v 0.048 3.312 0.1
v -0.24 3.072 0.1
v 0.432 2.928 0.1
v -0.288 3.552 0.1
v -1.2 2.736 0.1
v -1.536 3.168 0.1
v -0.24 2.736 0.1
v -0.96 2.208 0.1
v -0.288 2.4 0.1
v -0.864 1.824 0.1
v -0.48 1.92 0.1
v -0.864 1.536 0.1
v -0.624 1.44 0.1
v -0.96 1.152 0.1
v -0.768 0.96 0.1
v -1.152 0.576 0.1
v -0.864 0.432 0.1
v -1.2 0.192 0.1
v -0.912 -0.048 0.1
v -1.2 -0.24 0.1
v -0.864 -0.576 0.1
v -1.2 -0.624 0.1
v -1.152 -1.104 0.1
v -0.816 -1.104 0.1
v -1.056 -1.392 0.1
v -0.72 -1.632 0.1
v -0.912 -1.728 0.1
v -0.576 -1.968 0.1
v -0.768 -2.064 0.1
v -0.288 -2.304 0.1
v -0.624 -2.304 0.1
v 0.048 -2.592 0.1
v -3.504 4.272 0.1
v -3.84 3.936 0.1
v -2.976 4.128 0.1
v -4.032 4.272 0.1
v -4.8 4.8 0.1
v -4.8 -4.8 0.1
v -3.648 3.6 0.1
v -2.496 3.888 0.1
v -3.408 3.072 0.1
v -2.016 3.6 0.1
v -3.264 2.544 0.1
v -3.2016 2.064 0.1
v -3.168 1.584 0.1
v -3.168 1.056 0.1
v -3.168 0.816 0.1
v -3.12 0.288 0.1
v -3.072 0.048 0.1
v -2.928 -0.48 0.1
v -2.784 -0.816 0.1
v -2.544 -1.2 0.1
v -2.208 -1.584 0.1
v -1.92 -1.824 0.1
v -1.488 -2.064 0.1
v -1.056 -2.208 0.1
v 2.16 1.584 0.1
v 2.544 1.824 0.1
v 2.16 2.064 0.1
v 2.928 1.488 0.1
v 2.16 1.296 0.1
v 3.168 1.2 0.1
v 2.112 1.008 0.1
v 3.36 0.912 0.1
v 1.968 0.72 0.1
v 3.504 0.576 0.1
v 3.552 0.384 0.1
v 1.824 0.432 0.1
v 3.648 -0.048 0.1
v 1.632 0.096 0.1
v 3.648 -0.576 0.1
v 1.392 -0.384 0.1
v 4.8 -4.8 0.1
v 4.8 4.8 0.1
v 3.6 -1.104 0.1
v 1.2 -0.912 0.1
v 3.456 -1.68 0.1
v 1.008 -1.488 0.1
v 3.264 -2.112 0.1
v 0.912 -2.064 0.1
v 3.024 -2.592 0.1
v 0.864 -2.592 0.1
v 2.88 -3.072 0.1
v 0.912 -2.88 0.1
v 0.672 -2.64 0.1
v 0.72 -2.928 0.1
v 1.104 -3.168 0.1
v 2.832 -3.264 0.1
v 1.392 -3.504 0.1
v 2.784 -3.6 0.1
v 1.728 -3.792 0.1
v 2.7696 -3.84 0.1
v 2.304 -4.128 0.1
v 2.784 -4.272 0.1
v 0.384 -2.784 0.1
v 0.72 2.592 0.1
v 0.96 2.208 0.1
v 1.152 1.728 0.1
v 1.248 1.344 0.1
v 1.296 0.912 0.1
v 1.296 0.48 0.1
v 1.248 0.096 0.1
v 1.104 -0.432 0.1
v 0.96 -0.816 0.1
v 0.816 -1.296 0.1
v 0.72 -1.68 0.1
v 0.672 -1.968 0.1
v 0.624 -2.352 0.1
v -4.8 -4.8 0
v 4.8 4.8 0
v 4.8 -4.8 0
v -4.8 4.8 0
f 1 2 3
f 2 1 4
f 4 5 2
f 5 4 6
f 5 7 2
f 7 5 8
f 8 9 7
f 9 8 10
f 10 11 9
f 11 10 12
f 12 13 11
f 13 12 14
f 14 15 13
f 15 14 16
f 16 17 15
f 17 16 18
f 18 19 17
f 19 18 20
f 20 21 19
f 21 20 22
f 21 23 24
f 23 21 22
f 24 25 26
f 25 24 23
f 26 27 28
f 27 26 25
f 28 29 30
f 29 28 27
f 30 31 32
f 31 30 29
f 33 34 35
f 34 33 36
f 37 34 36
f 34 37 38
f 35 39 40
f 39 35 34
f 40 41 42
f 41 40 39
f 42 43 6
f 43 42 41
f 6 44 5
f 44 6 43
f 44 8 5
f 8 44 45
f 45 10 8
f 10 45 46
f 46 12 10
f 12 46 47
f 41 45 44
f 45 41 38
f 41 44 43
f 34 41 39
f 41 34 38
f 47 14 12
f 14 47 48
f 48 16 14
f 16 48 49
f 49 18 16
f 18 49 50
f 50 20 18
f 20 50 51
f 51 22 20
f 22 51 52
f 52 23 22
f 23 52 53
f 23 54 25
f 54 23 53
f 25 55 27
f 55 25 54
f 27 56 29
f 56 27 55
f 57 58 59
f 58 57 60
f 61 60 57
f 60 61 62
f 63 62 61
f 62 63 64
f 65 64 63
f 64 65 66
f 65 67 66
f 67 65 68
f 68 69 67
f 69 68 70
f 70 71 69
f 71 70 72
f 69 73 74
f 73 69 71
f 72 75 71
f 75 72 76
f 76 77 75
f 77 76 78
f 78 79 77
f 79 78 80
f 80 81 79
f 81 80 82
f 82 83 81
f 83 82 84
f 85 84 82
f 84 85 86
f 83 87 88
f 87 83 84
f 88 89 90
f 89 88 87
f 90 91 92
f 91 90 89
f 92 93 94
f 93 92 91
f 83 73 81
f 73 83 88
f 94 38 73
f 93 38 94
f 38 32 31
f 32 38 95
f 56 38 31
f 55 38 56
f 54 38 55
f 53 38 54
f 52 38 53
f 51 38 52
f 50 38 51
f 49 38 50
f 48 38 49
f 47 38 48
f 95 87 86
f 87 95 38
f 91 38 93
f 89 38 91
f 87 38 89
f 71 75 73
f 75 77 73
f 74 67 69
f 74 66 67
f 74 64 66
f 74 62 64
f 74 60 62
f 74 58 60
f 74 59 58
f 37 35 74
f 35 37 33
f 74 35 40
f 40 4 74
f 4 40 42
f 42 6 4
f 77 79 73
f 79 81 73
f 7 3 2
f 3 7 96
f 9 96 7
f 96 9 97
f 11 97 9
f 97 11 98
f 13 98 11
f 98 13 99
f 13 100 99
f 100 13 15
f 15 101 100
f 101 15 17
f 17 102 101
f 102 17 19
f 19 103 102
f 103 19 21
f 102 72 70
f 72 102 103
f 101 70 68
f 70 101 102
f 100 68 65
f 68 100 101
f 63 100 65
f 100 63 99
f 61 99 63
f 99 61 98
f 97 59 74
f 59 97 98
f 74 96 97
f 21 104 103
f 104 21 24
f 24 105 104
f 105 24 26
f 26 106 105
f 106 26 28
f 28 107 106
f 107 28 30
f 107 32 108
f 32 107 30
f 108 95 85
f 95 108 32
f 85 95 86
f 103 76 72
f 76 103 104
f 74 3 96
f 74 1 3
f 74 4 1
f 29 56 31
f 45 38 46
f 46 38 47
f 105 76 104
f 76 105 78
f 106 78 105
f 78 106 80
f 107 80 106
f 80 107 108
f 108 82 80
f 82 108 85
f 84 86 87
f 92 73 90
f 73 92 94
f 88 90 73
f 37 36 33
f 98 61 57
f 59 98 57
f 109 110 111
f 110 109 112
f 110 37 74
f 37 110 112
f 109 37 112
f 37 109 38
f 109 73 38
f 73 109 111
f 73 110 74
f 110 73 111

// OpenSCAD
// file: ../p/box5-12.scad
use <../lib.scad>
function ldraw_lib__box5_12() = [
// 0 Box with 5 Faces without Any Edges
// 0 Name: box5-12.dat
// 0 Author: Chris Dee [cwdee]
// 0 !LDRAW_ORG Primitive UPDATE 2009-02
// 0 !LICENSE Licensed under CC BY 4.0 : see CAreadme.txt
// 
// 0 BFC CERTIFY CCW
  [0,"BFC","CERTIFY"],
  [0,"BFC","CCW"],
// 
// 0 !HISTORY 2009-09-03 [PTadmin] Official Update 2009-02
// 
// 
// 4 16 1 1 1 1 1 -1 -1 1 -1 -1 1 1
  [4,16,1,1,1,1,1,-1,-1,1,-1,-1,1,1],
// 4 16 -1 0 1 1 0 1 1 1 1 -1 1 1
  [4,16,-1,0,1,1,0,1,1,1,1,-1,1,1],
// 4 16 -1 0 -1 -1 0 1 -1 1 1 -1 1 -1
  [4,16,-1,0,-1,-1,0,1,-1,1,1,-1,1,-1],
// 4 16 1 0 -1 -1 0 -1 -1 1 -1 1 1 -1
  [4,16,1,0,-1,-1,0,-1,-1,1,-1,1,1,-1],
// 4 16 1 0 1 1 0 -1 1 1 -1 1 1 1
  [4,16,1,0,1,1,0,-1,1,1,-1,1,1,1],
// 0
];
module ldraw_lib__box5_12(step=0, col=false, unit=2/5, alt=false, line=0.2, solid=!$preview)
    makepoly(ldraw_lib__box5_12(), step=step, col=col, unit=unit, alt=alt, line=line, solid=solid);
ldraw_lib__box5_12(line=0.2);
// file: 004659a.scad
use <../lib.scad>
use <../p/box5-12.scad>
use <s/004659as01.scad>
function ldraw_lib__004659a() = [
// 0 Sticker  1 x  1 Fire Emblem
// 0 Name: 004659a.dat
// 0 Author: Alex Taylor [anathema]
// 0 !LDRAW_ORG Part UPDATE 2013-01
// 0 !LICENSE Licensed under CC BY 4.0 : see CAreadme.txt
// 
// 0 BFC CERTIFY CCW
  [0,"BFC","CERTIFY"],
  [0,"BFC","CCW"],
// 
// 0 !HISTORY 2013-03-17 [MagFors] Used box primitive
// 0 !HISTORY 2013-07-21 [PTadmin] Official Update 2013-01
// 
// 
// 1 16 0 -0.25 0 1 0 0 0 1 0 0 0 1 s\004659as01.dat
  [1,16,0,-0.25,0,1,0,0,0,1,0,0,0,1, ldraw_lib__s__004659as01()],
// 1 16 0 -0.25 0 10 0 0 0 0.25 0 0 0 10 box5-12.dat
  [1,16,0,-0.25,0,10,0,0,0,0.25,0,0,0,10, ldraw_lib__box5_12()],
];
module ldraw_lib__004659a(step=0, col=false, unit=2/5, alt=false, line=0.2, solid=!$preview)
    makepoly(ldraw_lib__004659a(), step=step, col=col, unit=unit, alt=alt, line=line, solid=solid);
ldraw_lib__004659a(line=0.2);
// main file
use <../lib.scad>
use <004659a.scad>
function ldraw_lib__197885d() = [
// 0 Sticker  1.2 x  1.2 with Fire Logo
// 0 Name: 197885d.dat
// 0 Author: Takeshi Takahashi [RainbowDolphin]
// 0 !LDRAW_ORG Part UPDATE 2026-07
// 0 !LICENSE Licensed under CC BY 4.0 : see CAreadme.txt
// 
// 0 BFC CERTIFY CCW
  [0,"BFC","CERTIFY"],
  [0,"BFC","CCW"],
// 
// 0 !CATEGORY Sticker
// 0 !KEYWORDS BrickLink 4020stk01, Brickowl 352081, Fire boat, Rebrickable 197885
// 0 !KEYWORDS Set 4020, ship
// 
// 0 !HISTORY 2026-07-30 [OrionP] Official Update 2026-07
// 
// 
// 1 16 0 0 0 1.2 0 0 0 1 0 0 0 1.2 004659a.dat
  [1,16,0,0,0,1.2,0,0,0,1,0,0,0,1.2, ldraw_lib__004659a()],
];
module ldraw_lib__197885d(step=0, col=false, unit=2/5, alt=false, line=0.2, solid=!$preview)
    makepoly(ldraw_lib__197885d(), step=step, col=col, unit=unit, alt=alt, line=line, solid=solid);
ldraw_lib__197885d(line=0.2);
